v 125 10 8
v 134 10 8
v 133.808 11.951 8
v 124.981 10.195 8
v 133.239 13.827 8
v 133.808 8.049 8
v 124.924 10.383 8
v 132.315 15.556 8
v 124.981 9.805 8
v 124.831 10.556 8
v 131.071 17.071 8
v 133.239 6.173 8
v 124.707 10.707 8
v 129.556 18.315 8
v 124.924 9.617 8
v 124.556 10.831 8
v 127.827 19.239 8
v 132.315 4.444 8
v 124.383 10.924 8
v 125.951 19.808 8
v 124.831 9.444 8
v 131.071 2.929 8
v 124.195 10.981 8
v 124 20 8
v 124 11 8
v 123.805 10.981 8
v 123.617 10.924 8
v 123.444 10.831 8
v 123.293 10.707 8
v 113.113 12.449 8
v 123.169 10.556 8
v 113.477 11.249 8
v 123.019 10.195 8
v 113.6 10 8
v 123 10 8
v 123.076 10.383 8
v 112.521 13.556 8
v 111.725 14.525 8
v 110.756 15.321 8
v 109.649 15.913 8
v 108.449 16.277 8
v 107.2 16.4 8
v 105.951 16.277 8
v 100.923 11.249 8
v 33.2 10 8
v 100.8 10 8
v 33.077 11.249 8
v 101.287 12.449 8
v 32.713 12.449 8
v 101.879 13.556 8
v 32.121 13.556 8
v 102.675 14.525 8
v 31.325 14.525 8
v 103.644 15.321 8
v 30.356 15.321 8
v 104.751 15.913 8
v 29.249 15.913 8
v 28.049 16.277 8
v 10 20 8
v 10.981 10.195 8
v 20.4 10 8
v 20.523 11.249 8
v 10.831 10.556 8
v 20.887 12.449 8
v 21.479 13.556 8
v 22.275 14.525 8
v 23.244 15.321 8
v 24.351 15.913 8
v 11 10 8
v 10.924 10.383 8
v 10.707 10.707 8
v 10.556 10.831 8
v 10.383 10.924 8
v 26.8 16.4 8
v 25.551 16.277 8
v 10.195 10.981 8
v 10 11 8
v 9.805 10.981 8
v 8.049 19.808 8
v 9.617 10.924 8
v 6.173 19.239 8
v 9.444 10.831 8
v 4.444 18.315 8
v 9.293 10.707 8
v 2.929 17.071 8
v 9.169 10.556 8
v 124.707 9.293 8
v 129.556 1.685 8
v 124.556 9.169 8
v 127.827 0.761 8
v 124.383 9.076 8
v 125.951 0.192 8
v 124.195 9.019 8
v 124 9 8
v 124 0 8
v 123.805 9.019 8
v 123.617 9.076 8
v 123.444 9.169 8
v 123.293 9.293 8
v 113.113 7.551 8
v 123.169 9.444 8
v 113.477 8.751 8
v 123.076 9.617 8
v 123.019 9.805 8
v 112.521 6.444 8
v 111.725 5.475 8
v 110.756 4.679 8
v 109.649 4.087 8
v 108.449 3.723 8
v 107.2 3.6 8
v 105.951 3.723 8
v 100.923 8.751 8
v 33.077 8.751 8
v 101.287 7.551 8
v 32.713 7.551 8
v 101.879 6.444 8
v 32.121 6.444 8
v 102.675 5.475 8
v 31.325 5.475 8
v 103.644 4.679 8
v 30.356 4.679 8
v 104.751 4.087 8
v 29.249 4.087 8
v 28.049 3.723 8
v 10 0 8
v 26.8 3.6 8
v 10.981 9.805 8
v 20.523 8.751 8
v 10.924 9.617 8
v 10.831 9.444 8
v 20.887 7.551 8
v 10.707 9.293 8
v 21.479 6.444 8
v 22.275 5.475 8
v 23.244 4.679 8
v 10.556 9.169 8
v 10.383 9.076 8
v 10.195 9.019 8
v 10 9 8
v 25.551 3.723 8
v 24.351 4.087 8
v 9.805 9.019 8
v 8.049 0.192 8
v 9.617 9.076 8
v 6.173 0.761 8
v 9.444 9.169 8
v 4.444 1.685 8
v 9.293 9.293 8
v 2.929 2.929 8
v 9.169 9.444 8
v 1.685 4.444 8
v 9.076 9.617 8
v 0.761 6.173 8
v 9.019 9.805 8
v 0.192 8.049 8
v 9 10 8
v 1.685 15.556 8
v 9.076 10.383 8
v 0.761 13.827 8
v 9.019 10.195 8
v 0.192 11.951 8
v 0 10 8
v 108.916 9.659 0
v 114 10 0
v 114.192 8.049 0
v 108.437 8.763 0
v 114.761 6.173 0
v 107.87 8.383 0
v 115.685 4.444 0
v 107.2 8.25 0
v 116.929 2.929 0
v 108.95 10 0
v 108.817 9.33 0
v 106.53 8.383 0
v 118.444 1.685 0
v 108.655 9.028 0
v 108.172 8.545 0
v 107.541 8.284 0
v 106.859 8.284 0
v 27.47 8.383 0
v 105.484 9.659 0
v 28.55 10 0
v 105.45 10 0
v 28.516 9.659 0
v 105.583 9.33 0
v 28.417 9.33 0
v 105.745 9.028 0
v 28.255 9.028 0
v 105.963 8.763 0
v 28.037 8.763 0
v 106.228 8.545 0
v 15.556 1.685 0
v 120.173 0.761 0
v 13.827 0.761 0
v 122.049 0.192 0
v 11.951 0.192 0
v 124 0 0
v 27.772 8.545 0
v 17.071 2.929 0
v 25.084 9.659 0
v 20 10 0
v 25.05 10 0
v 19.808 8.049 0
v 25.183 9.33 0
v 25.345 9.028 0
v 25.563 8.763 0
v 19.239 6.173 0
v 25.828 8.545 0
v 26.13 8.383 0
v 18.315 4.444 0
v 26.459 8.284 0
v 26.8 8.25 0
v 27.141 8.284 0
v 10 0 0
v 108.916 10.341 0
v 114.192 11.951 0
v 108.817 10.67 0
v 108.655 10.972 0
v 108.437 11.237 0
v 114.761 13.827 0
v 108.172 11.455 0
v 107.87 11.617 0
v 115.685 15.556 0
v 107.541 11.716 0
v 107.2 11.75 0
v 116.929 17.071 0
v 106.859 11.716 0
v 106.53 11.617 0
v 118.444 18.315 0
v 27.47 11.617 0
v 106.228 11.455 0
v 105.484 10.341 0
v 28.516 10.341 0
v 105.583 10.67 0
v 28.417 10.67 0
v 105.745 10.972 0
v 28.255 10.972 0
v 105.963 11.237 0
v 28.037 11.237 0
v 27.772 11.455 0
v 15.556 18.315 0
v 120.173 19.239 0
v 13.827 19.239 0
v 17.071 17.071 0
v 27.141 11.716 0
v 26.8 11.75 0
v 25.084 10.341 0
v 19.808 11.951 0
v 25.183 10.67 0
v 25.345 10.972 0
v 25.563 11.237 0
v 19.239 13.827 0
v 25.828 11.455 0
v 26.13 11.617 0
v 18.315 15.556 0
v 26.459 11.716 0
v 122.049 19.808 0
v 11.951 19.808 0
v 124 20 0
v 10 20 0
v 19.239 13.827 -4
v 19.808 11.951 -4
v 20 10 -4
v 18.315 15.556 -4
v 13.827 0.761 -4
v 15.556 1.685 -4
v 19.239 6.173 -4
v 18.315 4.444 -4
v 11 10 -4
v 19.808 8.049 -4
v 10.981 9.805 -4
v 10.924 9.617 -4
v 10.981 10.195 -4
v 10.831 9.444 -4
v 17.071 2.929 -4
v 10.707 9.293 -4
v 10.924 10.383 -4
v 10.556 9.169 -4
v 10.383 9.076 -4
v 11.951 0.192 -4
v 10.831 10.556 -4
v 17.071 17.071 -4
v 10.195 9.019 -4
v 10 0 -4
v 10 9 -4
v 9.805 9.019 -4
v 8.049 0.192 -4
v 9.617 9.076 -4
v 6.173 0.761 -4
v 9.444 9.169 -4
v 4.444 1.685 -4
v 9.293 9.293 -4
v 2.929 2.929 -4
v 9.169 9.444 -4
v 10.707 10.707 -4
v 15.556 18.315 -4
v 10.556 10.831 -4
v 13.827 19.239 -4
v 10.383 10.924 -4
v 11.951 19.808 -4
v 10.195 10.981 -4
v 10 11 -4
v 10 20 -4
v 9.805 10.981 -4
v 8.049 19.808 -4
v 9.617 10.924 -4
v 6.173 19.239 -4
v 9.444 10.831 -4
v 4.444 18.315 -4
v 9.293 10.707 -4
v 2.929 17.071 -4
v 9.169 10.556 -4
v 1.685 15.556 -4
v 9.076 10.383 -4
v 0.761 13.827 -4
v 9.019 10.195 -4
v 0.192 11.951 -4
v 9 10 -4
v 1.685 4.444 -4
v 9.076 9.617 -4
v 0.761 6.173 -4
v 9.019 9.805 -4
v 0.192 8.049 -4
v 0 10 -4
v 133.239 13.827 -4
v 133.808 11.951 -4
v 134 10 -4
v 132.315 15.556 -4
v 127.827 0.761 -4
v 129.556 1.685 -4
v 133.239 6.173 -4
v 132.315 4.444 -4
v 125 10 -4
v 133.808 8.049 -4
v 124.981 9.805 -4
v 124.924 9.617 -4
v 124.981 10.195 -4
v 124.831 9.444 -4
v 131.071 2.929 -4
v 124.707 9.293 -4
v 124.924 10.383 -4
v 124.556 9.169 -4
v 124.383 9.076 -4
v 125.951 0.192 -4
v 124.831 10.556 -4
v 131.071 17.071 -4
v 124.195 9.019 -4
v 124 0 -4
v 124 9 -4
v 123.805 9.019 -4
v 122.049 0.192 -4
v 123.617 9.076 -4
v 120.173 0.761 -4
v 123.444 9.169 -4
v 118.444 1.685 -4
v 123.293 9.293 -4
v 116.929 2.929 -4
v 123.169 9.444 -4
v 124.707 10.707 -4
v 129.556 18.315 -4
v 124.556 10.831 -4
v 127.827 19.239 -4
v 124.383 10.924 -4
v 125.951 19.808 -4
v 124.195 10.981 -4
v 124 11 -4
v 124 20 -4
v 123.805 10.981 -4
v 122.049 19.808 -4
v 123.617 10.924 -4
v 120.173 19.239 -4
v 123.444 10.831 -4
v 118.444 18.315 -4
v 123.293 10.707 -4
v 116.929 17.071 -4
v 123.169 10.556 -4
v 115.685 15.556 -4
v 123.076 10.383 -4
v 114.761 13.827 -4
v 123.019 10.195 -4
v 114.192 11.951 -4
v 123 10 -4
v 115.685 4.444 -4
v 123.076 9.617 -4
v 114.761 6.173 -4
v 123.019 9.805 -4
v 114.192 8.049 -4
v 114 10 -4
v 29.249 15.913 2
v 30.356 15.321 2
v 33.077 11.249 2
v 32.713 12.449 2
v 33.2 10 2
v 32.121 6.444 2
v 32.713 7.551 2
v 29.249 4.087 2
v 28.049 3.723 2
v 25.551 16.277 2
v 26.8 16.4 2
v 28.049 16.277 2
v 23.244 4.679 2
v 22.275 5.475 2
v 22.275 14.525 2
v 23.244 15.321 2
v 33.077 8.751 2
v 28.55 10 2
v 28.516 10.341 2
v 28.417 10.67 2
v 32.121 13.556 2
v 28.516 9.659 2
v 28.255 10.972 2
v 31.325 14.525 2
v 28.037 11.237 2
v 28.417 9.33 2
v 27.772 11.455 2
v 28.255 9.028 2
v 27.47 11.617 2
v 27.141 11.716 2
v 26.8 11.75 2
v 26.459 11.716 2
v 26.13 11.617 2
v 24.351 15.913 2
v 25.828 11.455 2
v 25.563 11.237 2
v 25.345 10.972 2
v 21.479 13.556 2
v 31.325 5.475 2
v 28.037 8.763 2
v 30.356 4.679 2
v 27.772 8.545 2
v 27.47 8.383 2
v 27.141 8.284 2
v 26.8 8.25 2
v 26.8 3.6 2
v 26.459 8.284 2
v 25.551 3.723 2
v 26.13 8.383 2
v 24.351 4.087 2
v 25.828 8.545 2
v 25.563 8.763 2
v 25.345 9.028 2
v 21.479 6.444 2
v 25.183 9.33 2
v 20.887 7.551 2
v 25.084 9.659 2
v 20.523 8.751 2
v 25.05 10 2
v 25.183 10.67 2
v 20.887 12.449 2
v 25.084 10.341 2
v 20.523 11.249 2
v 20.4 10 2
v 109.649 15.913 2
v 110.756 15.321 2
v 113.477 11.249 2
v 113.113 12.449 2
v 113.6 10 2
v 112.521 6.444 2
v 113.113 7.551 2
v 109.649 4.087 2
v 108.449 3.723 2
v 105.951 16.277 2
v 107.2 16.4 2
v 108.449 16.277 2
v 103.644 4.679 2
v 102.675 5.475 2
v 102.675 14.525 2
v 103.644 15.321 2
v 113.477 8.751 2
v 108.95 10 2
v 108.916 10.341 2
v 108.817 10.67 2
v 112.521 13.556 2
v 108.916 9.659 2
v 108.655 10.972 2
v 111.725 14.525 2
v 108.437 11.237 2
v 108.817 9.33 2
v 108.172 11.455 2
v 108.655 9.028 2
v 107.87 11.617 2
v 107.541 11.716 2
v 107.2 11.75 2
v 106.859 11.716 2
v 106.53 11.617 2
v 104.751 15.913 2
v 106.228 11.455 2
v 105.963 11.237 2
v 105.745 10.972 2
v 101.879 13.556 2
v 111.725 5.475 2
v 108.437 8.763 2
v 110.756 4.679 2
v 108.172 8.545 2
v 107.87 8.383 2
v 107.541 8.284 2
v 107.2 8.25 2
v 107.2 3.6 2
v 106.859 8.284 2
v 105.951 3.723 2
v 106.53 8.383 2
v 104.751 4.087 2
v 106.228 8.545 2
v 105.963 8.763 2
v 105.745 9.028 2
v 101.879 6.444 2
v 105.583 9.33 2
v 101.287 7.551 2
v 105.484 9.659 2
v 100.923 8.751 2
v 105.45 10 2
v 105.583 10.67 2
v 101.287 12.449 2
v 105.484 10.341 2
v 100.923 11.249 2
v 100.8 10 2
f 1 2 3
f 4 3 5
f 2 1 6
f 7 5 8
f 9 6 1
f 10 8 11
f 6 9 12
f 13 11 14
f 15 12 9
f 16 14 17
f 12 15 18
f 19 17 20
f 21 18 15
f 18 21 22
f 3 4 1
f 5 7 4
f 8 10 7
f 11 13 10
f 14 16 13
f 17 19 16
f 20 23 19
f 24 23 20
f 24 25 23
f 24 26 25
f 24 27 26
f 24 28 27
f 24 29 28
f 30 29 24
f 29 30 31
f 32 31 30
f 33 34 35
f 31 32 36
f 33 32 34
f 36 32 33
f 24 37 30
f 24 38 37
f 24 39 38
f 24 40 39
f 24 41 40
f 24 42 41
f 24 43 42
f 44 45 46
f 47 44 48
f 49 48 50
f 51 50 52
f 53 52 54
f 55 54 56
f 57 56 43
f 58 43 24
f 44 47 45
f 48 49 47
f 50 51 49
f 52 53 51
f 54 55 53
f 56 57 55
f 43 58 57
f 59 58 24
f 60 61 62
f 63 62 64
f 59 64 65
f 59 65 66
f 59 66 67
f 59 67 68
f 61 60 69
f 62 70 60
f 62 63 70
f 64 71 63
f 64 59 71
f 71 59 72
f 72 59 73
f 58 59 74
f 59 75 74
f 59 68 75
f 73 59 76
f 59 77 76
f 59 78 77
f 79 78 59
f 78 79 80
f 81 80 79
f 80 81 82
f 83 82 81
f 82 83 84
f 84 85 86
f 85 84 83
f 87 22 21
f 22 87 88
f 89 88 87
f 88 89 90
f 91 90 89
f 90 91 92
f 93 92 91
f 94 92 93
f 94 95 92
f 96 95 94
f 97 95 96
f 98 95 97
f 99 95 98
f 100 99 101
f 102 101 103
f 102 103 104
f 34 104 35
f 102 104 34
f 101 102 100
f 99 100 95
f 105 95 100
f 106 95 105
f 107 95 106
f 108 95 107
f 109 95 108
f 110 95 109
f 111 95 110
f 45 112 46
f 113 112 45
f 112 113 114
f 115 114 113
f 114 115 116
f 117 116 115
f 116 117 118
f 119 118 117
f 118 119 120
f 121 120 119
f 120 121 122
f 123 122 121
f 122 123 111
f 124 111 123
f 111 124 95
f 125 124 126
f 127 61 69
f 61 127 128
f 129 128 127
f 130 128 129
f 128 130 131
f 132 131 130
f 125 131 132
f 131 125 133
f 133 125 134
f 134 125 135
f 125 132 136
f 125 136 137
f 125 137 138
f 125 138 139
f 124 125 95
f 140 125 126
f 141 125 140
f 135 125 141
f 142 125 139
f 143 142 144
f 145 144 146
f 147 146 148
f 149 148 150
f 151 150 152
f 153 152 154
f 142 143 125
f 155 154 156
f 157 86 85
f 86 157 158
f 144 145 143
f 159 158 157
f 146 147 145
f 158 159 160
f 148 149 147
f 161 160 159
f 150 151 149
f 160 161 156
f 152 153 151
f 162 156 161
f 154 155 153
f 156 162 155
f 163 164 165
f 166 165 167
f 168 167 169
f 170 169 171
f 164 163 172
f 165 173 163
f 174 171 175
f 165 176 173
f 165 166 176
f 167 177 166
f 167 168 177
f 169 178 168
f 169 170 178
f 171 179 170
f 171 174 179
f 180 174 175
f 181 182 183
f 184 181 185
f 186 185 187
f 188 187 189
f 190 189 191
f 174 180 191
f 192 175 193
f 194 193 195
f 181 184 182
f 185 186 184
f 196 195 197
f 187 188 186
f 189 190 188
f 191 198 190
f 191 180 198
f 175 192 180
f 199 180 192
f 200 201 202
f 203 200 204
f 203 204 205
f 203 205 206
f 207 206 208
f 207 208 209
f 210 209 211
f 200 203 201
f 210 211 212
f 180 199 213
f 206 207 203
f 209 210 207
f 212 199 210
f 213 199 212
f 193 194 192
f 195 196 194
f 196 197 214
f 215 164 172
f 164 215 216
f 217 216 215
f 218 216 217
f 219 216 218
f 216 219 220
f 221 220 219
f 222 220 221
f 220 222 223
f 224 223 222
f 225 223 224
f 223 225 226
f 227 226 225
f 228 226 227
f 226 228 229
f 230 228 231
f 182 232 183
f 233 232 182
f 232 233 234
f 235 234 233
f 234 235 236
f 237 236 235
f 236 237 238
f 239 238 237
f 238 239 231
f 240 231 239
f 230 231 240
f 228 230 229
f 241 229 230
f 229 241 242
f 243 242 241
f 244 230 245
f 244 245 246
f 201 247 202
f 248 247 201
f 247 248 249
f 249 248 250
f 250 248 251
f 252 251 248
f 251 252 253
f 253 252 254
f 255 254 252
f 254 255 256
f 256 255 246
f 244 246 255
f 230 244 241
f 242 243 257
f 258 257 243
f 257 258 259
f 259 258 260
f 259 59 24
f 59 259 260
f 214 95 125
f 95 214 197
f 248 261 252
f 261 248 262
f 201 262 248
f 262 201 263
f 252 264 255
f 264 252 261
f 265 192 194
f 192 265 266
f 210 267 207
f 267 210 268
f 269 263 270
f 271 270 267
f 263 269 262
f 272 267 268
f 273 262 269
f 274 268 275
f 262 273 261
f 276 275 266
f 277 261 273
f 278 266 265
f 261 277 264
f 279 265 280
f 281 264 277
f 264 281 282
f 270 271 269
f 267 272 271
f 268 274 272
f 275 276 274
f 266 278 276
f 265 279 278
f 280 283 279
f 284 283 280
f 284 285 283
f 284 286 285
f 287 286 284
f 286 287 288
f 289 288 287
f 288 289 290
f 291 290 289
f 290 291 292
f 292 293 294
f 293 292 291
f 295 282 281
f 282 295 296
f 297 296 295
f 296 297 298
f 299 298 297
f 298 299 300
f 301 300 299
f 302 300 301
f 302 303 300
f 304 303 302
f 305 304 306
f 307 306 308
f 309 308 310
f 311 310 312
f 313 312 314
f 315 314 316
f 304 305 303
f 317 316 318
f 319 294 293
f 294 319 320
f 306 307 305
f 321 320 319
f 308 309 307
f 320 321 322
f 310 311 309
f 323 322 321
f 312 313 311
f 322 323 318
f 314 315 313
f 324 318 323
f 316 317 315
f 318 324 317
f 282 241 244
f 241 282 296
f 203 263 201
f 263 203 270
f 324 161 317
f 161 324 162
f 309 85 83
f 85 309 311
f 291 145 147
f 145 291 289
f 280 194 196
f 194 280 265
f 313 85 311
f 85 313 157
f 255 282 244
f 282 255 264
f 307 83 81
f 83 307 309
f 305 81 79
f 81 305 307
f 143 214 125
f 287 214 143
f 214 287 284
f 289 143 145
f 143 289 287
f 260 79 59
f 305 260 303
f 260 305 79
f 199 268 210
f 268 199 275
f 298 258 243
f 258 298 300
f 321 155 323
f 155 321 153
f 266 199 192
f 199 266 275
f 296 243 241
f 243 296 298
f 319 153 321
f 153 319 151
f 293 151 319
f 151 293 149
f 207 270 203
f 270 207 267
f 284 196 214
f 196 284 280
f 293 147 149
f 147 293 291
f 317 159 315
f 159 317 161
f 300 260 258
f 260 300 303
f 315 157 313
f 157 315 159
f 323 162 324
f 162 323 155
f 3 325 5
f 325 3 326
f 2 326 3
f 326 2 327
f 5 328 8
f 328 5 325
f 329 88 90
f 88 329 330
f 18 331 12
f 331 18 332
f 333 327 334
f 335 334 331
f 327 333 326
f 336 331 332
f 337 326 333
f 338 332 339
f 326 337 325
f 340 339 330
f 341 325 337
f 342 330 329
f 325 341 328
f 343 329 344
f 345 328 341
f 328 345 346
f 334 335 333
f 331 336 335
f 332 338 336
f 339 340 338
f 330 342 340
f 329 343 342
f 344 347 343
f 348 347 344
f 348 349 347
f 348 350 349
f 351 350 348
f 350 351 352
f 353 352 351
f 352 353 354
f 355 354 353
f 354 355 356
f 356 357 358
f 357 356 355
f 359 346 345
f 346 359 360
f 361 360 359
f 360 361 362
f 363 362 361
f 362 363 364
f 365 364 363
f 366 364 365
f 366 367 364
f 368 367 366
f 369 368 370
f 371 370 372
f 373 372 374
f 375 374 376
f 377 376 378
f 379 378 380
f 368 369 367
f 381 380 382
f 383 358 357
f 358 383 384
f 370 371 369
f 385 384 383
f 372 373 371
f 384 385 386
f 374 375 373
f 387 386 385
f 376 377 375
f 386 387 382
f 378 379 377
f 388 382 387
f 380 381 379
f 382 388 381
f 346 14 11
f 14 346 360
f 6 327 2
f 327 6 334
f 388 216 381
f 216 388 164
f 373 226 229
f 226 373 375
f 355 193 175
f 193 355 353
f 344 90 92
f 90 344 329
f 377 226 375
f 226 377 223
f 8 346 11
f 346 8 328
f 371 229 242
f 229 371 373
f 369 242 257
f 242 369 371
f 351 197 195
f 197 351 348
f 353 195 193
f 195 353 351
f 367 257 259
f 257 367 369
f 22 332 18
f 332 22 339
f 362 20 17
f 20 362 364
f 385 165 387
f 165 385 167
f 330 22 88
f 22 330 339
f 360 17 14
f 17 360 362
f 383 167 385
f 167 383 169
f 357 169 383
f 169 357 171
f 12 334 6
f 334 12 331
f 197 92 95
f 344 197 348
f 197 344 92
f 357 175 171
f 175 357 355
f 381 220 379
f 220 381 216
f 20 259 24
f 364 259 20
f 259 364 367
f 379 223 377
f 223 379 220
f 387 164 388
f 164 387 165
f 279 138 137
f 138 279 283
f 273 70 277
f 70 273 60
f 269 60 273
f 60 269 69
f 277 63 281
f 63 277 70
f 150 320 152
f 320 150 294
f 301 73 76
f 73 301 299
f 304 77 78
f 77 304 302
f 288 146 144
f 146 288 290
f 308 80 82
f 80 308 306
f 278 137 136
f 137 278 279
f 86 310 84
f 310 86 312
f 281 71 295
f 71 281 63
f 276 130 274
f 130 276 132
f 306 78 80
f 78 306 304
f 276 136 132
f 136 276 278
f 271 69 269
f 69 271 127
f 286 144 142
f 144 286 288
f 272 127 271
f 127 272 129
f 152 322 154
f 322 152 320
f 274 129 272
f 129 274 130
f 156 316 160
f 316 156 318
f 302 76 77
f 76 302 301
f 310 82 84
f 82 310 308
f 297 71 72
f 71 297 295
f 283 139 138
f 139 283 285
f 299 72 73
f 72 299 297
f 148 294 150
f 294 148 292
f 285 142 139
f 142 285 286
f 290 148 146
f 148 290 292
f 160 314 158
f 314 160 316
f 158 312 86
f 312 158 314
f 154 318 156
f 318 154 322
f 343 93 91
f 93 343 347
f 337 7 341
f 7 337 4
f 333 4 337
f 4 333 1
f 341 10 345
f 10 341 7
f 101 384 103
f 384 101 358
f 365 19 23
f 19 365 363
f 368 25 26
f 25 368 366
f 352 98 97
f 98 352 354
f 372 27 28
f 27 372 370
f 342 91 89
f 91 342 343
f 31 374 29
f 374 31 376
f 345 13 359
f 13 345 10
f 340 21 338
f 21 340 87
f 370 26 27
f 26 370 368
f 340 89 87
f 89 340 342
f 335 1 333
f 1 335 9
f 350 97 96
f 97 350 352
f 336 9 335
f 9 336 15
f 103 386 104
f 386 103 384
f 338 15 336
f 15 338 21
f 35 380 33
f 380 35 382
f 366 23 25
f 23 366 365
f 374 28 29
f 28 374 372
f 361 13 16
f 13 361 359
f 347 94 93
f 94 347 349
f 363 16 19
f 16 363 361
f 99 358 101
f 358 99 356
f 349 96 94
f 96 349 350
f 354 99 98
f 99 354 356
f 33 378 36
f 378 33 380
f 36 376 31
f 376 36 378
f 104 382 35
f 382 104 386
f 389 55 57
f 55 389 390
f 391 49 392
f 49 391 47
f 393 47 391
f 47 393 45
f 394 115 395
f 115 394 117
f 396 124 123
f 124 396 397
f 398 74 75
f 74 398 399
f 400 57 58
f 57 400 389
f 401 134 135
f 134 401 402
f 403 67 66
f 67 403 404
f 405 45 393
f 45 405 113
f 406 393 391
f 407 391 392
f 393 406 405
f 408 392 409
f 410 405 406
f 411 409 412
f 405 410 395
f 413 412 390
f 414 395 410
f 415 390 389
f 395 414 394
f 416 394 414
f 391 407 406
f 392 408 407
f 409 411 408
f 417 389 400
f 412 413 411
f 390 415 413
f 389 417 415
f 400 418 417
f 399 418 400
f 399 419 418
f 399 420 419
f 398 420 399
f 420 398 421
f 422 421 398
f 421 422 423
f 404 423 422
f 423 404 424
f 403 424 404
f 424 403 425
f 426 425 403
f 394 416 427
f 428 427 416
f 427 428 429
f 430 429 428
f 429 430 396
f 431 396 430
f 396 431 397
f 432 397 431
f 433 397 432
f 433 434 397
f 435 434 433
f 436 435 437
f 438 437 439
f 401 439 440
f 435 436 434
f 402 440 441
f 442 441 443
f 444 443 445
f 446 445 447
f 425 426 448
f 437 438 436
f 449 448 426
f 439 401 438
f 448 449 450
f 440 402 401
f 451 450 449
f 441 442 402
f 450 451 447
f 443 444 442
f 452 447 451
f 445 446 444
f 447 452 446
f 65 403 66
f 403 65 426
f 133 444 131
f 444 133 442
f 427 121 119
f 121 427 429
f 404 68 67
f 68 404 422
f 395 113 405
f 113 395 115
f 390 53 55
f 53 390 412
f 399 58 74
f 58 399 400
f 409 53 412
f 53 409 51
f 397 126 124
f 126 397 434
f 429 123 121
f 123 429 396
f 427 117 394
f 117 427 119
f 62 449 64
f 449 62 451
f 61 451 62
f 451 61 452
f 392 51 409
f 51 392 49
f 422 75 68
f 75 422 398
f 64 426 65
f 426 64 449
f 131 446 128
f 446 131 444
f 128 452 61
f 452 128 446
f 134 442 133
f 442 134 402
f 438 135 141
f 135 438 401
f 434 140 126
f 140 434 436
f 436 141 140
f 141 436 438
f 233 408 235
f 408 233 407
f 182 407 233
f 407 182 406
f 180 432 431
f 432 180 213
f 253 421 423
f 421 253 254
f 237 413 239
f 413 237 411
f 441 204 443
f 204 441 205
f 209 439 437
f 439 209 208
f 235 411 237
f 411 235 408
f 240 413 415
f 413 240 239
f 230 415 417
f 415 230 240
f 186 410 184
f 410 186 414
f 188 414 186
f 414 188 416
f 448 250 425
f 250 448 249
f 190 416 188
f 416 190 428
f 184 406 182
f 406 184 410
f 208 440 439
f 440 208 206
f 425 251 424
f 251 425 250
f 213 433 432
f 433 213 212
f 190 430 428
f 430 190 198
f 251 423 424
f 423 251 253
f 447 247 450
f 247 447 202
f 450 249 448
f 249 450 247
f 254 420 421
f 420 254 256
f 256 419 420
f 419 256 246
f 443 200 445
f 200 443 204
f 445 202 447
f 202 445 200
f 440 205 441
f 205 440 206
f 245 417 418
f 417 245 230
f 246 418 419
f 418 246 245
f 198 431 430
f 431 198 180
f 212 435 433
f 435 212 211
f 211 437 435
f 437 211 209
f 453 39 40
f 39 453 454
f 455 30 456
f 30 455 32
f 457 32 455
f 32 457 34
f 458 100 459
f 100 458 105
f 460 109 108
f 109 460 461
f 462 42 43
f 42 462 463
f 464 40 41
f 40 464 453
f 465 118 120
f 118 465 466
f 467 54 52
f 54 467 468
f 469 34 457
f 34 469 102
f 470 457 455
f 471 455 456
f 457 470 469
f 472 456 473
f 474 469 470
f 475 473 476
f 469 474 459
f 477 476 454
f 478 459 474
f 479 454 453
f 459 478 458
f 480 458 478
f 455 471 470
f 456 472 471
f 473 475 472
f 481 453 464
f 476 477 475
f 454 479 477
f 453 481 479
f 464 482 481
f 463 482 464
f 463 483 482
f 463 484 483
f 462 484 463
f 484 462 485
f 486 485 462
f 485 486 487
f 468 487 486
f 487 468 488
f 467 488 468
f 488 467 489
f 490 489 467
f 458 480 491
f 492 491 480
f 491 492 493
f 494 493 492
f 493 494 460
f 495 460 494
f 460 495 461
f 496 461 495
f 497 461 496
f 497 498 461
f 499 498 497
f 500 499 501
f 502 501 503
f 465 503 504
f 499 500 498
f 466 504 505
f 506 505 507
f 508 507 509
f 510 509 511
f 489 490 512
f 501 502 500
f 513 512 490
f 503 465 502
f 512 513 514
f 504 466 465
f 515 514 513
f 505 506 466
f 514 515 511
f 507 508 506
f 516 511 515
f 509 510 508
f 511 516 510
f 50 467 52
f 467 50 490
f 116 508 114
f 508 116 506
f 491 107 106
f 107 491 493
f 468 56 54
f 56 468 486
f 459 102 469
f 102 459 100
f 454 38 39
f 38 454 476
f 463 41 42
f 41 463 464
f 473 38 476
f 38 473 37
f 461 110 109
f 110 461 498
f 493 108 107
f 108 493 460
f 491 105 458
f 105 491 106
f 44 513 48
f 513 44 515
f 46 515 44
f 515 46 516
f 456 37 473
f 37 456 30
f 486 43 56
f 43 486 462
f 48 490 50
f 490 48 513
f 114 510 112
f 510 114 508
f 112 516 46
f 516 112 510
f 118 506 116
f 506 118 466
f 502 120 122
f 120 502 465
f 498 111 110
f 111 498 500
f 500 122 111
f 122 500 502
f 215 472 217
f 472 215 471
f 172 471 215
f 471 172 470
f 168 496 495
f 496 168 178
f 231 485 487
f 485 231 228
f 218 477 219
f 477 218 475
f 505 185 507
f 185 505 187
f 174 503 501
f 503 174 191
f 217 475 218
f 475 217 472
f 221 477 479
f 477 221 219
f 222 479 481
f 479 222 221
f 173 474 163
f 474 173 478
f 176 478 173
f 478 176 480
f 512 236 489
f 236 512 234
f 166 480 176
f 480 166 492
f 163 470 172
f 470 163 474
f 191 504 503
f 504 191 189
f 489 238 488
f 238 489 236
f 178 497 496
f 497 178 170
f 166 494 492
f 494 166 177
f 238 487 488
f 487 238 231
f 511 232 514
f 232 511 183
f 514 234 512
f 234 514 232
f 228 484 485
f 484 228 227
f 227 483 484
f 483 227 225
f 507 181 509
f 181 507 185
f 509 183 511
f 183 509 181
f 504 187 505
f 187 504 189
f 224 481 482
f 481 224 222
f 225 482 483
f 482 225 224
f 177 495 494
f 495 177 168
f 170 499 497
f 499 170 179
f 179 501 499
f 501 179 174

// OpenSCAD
// [FL_INDEX: keywords="openscad, 3d_parametric, Magnetic_Mount_for_Jumper_Wire_Rack, csg_solid" | COT="Parametric OpenSCAD design from 3DCodeverse"]
// Title: Magnetic Mount for Jumper Wire Rack

// This script creates a wire rack with a variable number of tines

$fn = 32;

// Tine dimensions
N = 8;			// Number of tines
tine_w = 10;
tine_h = 4;
tine_length = 30;
tine_pitch = 12;

// Base dimensions
base_h = 20;
base_w = base_h*2 + (N-1)*(tine_pitch) + tine_w;
base_t = 8;

// Endcap dimensions
cap_t = 12;

// Magnet inlay dimensions
M = 2;		// Number of magnetics
//mag_w = 4.2;
//mag_h = 10.2;
mag_t = 6;
mag_d = 12.6 + 0.2;
mag_offs = base_w/5;
mag_pitch = base_w*3/5;


echo("<b>Base width [mm]:", base_w);

// Mounting hole dimensions
countersink_d = 0;
screw_d = 2;

difference()
{
	// Baseplate
	union()
	{
		translate([base_h/2,0,0]) cube([base_w-base_h,base_h,base_t]);
		translate([base_h/2,base_h/2,base_t-cap_t]) cylinder(cap_t,base_h/2,base_h/2);
		translate([base_w-base_h/2,base_h/2,base_t-cap_t]) cylinder(cap_t,base_h/2,base_h/2);		
	}

	// Screw holes
	for (i = [0:1])
	{
		translate([base_h/2+(base_w-base_h)*i,base_h/2,base_t])
		{
			union()
			{
				// Countersink
				cylinder(base_t,countersink_d/2,countersink_d/2,true);

				// Screw hole
				cylinder(cap_t*3,screw_d/2,screw_d/2,true);
			}

		}
	}

	// Text
	/*translate([base_w/2-10.75*2.4,2,base_t-1])
		scale([12,12,2])
			import("WireRackText.stl");*/

	// Magnet inlays
	for (i = [0:(M-1)])
	{
		translate([mag_offs + mag_pitch*i, base_h/2, base_t-mag_t])
		{
			cylinder(mag_t+1, mag_d/2, mag_d/2);

			// Hole for magnet removal 
			cylinder(base_t*2, 3.5/2, 3.5/2, true);
		}
	}
}

// Tines
/*for (i = [0:(N-1)])
{
	// Tine
	translate([base_h + tine_pitch*i, base_h - tine_h, 0])
		cube([tine_w,tine_h,tine_length]);

	// Tine support
	translate([base_h + tine_pitch*i, base_h-tine_h, 0])
		rotate([45, 0, 0])
			cube([tine_w, tine_h, tine_h]);

	// Upturned tine end
	translate([base_h+tine_pitch*i,base_h-tine_h,tine_length])
		rotate([-30,0,0])
			cube([tine_w,tine_h,tine_h]);
}*/
